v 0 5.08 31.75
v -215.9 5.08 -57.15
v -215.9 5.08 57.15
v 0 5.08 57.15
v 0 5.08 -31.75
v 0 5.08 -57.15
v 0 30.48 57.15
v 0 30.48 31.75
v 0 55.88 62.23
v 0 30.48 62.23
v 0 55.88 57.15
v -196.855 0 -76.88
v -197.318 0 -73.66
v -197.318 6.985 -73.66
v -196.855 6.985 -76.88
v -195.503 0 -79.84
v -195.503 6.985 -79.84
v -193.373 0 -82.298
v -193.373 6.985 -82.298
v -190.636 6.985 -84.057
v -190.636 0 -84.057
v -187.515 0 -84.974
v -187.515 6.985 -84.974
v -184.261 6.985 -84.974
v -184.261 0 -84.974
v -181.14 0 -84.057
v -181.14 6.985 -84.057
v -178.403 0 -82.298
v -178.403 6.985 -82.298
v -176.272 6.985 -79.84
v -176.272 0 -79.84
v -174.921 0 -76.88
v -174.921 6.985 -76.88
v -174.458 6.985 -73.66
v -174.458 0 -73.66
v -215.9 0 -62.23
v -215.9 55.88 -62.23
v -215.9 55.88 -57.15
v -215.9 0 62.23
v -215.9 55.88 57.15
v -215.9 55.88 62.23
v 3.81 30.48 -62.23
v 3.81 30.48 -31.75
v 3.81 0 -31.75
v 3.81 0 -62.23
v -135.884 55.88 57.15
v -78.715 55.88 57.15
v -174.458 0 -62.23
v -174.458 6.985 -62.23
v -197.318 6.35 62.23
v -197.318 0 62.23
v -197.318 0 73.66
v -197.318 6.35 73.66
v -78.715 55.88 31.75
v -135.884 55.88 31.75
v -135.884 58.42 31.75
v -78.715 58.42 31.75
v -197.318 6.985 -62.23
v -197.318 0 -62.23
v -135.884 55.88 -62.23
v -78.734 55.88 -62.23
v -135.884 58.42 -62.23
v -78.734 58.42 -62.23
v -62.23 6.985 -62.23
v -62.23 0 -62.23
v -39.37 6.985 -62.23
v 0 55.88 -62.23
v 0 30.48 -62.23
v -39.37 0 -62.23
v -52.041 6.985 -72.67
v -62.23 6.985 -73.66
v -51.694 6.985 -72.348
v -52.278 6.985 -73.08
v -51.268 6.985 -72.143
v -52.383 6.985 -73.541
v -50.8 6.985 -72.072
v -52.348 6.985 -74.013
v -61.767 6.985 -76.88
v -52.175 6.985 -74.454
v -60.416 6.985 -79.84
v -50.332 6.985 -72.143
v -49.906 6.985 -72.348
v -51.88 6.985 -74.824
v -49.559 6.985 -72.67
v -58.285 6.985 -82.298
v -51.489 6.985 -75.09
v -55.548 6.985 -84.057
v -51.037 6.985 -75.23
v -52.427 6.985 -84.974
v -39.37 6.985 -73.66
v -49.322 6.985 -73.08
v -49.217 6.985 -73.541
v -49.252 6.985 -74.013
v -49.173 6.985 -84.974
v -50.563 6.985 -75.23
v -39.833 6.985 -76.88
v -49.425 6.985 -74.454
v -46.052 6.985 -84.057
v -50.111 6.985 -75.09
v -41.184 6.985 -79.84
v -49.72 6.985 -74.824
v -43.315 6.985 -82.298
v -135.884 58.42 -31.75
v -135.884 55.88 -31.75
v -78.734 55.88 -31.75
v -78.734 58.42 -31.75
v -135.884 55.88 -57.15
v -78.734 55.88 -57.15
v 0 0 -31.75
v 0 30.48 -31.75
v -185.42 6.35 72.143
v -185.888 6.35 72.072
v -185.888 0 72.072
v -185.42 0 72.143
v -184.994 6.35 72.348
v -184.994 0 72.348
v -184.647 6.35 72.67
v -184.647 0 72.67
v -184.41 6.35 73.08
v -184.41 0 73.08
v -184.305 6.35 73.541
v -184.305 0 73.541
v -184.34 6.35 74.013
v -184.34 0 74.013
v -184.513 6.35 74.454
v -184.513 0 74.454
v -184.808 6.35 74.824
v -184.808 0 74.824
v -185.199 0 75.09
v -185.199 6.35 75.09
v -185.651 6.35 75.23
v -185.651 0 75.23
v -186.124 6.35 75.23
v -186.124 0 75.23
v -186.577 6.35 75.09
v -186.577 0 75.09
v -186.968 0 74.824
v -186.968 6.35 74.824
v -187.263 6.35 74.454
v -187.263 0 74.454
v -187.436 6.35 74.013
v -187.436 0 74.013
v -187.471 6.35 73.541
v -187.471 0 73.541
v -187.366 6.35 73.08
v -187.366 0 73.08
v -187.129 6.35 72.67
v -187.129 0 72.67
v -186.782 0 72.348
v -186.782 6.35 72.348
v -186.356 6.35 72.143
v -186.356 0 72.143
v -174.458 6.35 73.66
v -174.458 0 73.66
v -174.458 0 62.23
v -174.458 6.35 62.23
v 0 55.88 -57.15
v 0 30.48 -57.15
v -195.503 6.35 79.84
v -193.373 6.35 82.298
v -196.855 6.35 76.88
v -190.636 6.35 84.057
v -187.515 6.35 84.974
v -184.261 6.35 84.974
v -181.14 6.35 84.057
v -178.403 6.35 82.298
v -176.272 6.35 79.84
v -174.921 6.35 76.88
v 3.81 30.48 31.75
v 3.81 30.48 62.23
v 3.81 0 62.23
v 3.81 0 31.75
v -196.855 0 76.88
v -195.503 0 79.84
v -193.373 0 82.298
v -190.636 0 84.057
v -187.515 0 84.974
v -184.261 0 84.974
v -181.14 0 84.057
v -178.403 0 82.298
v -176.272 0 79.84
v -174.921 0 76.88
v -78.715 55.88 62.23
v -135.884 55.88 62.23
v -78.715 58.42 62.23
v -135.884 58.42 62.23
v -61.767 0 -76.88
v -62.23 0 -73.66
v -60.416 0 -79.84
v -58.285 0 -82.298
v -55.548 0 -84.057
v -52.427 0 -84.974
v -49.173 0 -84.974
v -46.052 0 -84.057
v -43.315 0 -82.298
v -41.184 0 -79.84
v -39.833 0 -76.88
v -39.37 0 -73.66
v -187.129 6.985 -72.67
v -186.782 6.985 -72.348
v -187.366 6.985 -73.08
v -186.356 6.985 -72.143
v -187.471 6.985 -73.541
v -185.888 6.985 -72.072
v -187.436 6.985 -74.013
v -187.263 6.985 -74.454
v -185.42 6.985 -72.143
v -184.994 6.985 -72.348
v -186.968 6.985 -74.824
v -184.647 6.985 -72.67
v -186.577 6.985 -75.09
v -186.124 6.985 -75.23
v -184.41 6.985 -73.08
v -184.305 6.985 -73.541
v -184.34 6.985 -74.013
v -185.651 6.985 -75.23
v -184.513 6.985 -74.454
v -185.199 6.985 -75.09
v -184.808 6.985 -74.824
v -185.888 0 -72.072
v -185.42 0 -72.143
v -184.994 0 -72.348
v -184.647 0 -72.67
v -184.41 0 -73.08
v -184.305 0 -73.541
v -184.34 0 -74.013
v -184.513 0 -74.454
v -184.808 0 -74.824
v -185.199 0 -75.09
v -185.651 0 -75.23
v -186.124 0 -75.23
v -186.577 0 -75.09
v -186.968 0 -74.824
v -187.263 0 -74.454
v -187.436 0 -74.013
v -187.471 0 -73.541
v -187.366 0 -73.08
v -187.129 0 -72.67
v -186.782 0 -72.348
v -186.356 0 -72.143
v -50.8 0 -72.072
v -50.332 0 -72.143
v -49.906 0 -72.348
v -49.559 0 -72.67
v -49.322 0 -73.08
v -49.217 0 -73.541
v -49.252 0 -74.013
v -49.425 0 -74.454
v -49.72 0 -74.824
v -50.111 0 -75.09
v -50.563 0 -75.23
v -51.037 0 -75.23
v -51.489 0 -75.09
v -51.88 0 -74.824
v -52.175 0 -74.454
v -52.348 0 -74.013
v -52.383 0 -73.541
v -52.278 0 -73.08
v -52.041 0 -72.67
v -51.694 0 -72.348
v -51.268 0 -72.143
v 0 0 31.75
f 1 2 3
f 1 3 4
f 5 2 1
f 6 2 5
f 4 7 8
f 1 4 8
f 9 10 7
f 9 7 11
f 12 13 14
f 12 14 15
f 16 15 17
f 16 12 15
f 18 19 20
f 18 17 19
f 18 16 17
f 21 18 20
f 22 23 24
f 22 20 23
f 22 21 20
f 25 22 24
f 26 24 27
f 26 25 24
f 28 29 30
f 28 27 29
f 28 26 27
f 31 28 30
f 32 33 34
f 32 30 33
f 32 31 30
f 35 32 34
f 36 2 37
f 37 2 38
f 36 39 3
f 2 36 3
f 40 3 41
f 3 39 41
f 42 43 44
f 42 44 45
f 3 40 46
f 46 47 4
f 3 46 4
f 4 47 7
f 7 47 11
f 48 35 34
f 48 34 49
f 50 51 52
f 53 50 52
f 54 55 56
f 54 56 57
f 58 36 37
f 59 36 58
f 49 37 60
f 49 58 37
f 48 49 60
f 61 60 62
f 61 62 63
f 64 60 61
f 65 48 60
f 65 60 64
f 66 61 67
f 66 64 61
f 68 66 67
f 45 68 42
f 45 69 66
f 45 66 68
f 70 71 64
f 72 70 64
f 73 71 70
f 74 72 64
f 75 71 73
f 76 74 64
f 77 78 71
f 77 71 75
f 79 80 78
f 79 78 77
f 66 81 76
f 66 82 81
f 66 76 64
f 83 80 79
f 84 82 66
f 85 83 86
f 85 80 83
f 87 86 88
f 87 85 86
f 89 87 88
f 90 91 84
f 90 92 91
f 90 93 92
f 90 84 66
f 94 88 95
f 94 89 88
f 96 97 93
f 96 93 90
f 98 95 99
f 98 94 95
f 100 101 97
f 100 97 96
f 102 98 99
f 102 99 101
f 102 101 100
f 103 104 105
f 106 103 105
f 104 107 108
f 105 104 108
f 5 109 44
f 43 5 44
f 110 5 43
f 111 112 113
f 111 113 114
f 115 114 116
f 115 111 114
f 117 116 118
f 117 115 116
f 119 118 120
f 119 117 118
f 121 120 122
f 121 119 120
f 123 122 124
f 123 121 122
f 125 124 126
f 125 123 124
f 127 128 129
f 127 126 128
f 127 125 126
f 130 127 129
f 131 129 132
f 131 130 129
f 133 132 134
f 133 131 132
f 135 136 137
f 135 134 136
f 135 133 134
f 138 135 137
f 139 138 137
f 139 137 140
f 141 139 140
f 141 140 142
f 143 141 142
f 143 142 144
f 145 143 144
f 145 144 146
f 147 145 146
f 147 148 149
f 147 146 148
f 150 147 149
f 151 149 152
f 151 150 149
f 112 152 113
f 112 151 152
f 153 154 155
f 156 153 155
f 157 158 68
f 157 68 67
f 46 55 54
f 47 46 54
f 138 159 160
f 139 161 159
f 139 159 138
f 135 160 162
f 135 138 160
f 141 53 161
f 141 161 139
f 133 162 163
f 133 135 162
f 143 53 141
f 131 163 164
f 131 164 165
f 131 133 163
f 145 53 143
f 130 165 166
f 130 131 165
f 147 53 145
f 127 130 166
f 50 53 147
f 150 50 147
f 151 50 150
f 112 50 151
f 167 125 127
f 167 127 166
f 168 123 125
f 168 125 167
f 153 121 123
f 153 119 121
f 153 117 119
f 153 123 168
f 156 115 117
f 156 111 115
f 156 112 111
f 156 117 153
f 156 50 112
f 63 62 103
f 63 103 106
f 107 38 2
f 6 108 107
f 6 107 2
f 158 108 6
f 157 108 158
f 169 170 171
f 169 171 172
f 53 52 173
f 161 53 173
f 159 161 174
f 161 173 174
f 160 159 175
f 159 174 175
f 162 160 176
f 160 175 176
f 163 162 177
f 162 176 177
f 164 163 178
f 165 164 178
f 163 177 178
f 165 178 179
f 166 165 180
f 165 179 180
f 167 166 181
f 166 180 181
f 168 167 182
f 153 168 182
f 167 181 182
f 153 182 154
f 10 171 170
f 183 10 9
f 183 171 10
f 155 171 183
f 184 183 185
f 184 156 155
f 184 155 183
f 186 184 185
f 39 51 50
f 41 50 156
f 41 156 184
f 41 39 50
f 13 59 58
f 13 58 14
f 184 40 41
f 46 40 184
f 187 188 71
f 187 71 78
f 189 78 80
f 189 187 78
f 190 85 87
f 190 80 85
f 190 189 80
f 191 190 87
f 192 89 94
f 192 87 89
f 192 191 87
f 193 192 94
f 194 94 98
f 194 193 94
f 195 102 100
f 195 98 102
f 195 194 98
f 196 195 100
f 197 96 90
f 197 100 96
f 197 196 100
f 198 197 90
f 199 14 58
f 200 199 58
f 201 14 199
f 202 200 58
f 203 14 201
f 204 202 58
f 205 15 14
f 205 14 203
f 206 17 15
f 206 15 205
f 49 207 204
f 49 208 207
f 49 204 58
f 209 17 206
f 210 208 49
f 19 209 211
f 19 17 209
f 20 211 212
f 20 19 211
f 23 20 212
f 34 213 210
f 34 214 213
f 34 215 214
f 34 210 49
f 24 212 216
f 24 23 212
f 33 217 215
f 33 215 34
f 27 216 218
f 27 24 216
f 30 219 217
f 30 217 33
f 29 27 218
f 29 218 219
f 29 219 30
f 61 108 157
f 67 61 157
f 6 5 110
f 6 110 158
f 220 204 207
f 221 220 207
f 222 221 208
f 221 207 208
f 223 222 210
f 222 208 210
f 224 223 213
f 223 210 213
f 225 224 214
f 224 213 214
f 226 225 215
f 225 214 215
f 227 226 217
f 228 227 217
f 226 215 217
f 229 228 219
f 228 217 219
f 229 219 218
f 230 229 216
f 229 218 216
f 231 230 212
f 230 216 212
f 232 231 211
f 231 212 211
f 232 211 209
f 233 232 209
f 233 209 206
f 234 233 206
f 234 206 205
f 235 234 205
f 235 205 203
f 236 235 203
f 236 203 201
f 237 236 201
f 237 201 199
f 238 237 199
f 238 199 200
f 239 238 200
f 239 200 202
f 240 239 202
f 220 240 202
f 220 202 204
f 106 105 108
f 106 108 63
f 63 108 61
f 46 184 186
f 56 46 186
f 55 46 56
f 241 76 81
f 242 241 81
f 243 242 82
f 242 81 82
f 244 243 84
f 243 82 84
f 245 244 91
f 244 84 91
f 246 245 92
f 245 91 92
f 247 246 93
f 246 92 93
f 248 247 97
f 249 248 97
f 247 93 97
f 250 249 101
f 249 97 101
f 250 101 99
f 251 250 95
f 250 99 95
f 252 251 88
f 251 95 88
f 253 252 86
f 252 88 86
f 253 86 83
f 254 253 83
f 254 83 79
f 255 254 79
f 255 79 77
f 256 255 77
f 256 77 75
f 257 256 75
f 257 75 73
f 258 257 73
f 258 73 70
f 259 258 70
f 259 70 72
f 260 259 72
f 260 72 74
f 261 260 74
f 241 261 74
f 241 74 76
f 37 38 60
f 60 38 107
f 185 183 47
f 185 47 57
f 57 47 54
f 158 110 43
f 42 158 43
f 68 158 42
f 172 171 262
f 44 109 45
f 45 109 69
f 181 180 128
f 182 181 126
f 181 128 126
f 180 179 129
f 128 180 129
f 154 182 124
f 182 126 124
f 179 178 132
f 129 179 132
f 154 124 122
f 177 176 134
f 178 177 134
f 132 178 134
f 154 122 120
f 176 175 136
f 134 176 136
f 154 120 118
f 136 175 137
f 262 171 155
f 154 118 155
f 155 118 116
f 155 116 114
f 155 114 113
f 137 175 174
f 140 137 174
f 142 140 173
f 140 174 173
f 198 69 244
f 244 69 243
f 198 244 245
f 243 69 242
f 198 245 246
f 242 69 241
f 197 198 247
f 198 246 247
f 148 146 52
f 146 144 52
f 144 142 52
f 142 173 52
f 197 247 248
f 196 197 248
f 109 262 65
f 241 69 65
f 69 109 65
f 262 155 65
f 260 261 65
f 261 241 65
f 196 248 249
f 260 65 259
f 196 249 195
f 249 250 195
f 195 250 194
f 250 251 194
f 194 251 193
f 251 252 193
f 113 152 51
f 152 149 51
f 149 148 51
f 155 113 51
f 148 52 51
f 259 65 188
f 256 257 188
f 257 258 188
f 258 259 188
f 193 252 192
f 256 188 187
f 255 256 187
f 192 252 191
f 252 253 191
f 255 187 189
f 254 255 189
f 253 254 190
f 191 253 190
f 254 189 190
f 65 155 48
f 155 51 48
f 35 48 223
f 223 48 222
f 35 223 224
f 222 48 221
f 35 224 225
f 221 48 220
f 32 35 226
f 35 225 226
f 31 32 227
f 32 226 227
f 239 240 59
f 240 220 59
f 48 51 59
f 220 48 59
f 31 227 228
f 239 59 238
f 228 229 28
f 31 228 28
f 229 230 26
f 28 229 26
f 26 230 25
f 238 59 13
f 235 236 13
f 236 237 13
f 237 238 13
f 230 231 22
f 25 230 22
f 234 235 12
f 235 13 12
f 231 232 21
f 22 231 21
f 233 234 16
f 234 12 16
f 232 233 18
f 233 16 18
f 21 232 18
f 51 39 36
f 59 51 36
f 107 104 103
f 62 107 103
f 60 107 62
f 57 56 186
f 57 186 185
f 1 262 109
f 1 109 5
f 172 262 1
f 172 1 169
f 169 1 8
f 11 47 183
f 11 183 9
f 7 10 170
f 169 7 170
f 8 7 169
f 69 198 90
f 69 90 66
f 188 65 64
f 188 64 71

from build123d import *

# Parameters (mm, degrees)
SKETCH1_W           = 215.9
SKETCH1_H           = 114.3
BOSS_EXTRUDE1_DEPTH = 5.08
SKETCH2_W           = 215.9
SKETCH2_H           = 55.88
BOSS_EXTRUDE2_DEPTH = 5.08
SKETCH4_W           = 30.48
SKETCH4_H           = 30.48
BOSS_EXTRUDE3_DEPTH = 3.81
SKETCH5_W           = 57.15
SKETCH5_H           = 30.48
SKETCH5_W_2         = 57.169606557
BOSS_EXTRUDE4_DEPTH = 2.54
BOSS_EXTRUDE6_DEPTH = 15.875
SKETCH14_R          = 1.5875
CUT_EXTRUDE1_DEPTH  = 236.930487909
BOSS_EXTRUDE7_DEPTH = 15.875
SKETCH21_R          = 1.5875
CUT_EXTRUDE6_DEPTH  = 236.930487909
CUT_EXTRUDE10_START = -9.525
CUT_EXTRUDE10_DEPTH = 9.525
CUT_EXTRUDE11_START = -8.89
CUT_EXTRUDE11_DEPTH = 8.89
CUT_EXTRUDE12_START = -8.89
CUT_EXTRUDE12_DEPTH = 8.89


with BuildPart() as part:
    # Sketch1 → Boss-Extrude1 (new body)
    with BuildSketch(Plane(origin=(0, 0, 0), x_dir=(1, 0, 0), z_dir=(0, 1, 0))):
        with Locations((-107.95, 0)):
            Rectangle(SKETCH1_W, SKETCH1_H)
    extrude(amount=BOSS_EXTRUDE1_DEPTH)

    # Sketch2 → Boss-Extrude2 (add)
    with BuildSketch(Plane.XY.offset(57.15)):
        with Locations((-107.95, 27.94)):
            Rectangle(SKETCH2_W, SKETCH2_H)
    boss_extrude2 = extrude(amount=BOSS_EXTRUDE2_DEPTH)

    # Mirror1: Boss-Extrude2 across plane
    add(boss_extrude2.mirror(Plane.XY))

    # Sketch4 → Boss-Extrude3 (add)
    with BuildSketch(Plane(origin=(0, 0, 0), x_dir=(0, 0, -1), z_dir=(1, 0, 0))):
        with Locations((-46.99, 15.24)):
            Rectangle(SKETCH4_W, SKETCH4_H)
        with Locations((46.99, 15.24)):
            Rectangle(SKETCH4_W, SKETCH4_H)
    extrude(amount=BOSS_EXTRUDE3_DEPTH)

    # Sketch5 → Boss-Extrude4 (add)
    with BuildSketch(Plane(origin=(0, 55.88, 0), x_dir=(1, 0, 0), z_dir=(0, 1, 0))):
        with Locations((-107.309206557, 46.99)):
            Rectangle(SKETCH5_W, SKETCH5_H)
        with Locations((-107.299403278, -46.99)):
            Rectangle(SKETCH5_W_2, SKETCH5_H)
    extrude(amount=BOSS_EXTRUDE4_DEPTH)

    # Sketch12 → Boss-Extrude6 (add)
    with BuildSketch(Plane(origin=(0, 0, 0), x_dir=(1, 0, 0), z_dir=(0, 1, 0))):
        with BuildLine():
            Line((-62.23, 62.23), (-62.23, 73.66))
            ThreePointArc((-62.23, 73.66), (-50.8, 85.09), (-39.37, 73.66))
            Line((-39.37, 73.66), (-39.37, 62.23))
            Line((-39.37, 62.23), (-62.23, 62.23))
        make_face()
    extrude(amount=BOSS_EXTRUDE6_DEPTH)

    # Sketch14 → Cut-Extrude1 (cut, through all)
    with BuildSketch(Plane(origin=(0, 15.875, 0), x_dir=(1, 0, 0), z_dir=(0, 1, 0))):
        with Locations(Location((-50.8, 73.66, 0), (0, 0, 270))):
            Circle(SKETCH14_R)
    extrude(amount=-CUT_EXTRUDE1_DEPTH, mode=Mode.SUBTRACT)

    # Sketch20 → Boss-Extrude7 (add)
    with BuildSketch(Plane(origin=(0, 0, 0), x_dir=(1, 0, 0), z_dir=(0, 1, 0))):
        with BuildLine():
            Line((-197.317867116, 62.23), (-197.317867116, 73.66))
            ThreePointArc((-197.317867116, 73.66), (-185.887867116, 85.09), (-174.457867116, 73.66))
            Line((-174.457867116, 73.66), (-174.457867116, 62.23))
            Line((-174.457867116, 62.23), (-197.317867116, 62.23))
        make_face()
    boss_extrude7 = extrude(amount=BOSS_EXTRUDE7_DEPTH)

    # Sketch21 → Cut-Extrude6 (cut, through all)
    with BuildSketch(Plane(origin=(0, 15.875, 0), x_dir=(1, 0, 0), z_dir=(0, 1, 0))):
        with Locations(Location((-185.887867116, 73.66, 0), (0, 0, 270))):
            Circle(SKETCH21_R)
    cut_extrude6 = extrude(amount=-CUT_EXTRUDE6_DEPTH, mode=Mode.SUBTRACT)

    # Mirror4: Boss-Extrude7 across plane
    add(boss_extrude7.mirror(Plane.XY))

    # Mirror5: Cut-Extrude6 across plane
    add(cut_extrude6.mirror(Plane.XY), mode=Mode.SUBTRACT)

    # Sketch25 → Cut-Extrude10 (cut)
    with BuildSketch(Plane(origin=(0, 15.875, 0), x_dir=(1, 0, 0), z_dir=(0, 1, 0)).offset(CUT_EXTRUDE10_START)):
        with BuildLine():
            Line((-197.317867116, -62.23), (-197.317867116, -73.66))
            ThreePointArc((-197.317867116, -73.66), (-185.887867116, -85.09), (-174.457867116, -73.66))
            Line((-174.457867116, -73.66), (-174.457867116, -62.23))
            Line((-174.457867116, -62.23), (-197.317867116, -62.23))
        make_face()
    extrude(amount=CUT_EXTRUDE10_DEPTH, mode=Mode.SUBTRACT)

    # Sketch26 → Cut-Extrude11 (cut)
    with BuildSketch(Plane(origin=(0, 15.875, 0), x_dir=(1, 0, 0), z_dir=(0, 1, 0)).offset(CUT_EXTRUDE11_START)):
        with BuildLine():
            Line((-62.23, 62.23), (-39.37, 62.23))
            Line((-39.37, 62.23), (-39.37, 73.66))
            ThreePointArc((-39.37, 73.66), (-50.8, 85.09), (-62.23, 73.66))
            Line((-62.23, 73.66), (-62.23, 62.23))
        make_face()
    extrude(amount=CUT_EXTRUDE11_DEPTH, mode=Mode.SUBTRACT)

    # Sketch27 → Cut-Extrude12 (cut)
    with BuildSketch(Plane(origin=(0, 15.875, 0), x_dir=(1, 0, 0), z_dir=(0, 1, 0)).offset(CUT_EXTRUDE12_START)):
        with BuildLine():
            Line((-197.317867116, 62.23), (-174.457867116, 62.23))
            Line((-174.457867116, 62.23), (-174.457867116, 73.66))
            ThreePointArc((-174.457867116, 73.66), (-185.887867116, 85.09), (-197.317867116, 73.66))
            Line((-197.317867116, 73.66), (-197.317867116, 62.23))
        make_face()
    extrude(amount=CUT_EXTRUDE12_DEPTH, mode=Mode.SUBTRACT)


solid = part.part
